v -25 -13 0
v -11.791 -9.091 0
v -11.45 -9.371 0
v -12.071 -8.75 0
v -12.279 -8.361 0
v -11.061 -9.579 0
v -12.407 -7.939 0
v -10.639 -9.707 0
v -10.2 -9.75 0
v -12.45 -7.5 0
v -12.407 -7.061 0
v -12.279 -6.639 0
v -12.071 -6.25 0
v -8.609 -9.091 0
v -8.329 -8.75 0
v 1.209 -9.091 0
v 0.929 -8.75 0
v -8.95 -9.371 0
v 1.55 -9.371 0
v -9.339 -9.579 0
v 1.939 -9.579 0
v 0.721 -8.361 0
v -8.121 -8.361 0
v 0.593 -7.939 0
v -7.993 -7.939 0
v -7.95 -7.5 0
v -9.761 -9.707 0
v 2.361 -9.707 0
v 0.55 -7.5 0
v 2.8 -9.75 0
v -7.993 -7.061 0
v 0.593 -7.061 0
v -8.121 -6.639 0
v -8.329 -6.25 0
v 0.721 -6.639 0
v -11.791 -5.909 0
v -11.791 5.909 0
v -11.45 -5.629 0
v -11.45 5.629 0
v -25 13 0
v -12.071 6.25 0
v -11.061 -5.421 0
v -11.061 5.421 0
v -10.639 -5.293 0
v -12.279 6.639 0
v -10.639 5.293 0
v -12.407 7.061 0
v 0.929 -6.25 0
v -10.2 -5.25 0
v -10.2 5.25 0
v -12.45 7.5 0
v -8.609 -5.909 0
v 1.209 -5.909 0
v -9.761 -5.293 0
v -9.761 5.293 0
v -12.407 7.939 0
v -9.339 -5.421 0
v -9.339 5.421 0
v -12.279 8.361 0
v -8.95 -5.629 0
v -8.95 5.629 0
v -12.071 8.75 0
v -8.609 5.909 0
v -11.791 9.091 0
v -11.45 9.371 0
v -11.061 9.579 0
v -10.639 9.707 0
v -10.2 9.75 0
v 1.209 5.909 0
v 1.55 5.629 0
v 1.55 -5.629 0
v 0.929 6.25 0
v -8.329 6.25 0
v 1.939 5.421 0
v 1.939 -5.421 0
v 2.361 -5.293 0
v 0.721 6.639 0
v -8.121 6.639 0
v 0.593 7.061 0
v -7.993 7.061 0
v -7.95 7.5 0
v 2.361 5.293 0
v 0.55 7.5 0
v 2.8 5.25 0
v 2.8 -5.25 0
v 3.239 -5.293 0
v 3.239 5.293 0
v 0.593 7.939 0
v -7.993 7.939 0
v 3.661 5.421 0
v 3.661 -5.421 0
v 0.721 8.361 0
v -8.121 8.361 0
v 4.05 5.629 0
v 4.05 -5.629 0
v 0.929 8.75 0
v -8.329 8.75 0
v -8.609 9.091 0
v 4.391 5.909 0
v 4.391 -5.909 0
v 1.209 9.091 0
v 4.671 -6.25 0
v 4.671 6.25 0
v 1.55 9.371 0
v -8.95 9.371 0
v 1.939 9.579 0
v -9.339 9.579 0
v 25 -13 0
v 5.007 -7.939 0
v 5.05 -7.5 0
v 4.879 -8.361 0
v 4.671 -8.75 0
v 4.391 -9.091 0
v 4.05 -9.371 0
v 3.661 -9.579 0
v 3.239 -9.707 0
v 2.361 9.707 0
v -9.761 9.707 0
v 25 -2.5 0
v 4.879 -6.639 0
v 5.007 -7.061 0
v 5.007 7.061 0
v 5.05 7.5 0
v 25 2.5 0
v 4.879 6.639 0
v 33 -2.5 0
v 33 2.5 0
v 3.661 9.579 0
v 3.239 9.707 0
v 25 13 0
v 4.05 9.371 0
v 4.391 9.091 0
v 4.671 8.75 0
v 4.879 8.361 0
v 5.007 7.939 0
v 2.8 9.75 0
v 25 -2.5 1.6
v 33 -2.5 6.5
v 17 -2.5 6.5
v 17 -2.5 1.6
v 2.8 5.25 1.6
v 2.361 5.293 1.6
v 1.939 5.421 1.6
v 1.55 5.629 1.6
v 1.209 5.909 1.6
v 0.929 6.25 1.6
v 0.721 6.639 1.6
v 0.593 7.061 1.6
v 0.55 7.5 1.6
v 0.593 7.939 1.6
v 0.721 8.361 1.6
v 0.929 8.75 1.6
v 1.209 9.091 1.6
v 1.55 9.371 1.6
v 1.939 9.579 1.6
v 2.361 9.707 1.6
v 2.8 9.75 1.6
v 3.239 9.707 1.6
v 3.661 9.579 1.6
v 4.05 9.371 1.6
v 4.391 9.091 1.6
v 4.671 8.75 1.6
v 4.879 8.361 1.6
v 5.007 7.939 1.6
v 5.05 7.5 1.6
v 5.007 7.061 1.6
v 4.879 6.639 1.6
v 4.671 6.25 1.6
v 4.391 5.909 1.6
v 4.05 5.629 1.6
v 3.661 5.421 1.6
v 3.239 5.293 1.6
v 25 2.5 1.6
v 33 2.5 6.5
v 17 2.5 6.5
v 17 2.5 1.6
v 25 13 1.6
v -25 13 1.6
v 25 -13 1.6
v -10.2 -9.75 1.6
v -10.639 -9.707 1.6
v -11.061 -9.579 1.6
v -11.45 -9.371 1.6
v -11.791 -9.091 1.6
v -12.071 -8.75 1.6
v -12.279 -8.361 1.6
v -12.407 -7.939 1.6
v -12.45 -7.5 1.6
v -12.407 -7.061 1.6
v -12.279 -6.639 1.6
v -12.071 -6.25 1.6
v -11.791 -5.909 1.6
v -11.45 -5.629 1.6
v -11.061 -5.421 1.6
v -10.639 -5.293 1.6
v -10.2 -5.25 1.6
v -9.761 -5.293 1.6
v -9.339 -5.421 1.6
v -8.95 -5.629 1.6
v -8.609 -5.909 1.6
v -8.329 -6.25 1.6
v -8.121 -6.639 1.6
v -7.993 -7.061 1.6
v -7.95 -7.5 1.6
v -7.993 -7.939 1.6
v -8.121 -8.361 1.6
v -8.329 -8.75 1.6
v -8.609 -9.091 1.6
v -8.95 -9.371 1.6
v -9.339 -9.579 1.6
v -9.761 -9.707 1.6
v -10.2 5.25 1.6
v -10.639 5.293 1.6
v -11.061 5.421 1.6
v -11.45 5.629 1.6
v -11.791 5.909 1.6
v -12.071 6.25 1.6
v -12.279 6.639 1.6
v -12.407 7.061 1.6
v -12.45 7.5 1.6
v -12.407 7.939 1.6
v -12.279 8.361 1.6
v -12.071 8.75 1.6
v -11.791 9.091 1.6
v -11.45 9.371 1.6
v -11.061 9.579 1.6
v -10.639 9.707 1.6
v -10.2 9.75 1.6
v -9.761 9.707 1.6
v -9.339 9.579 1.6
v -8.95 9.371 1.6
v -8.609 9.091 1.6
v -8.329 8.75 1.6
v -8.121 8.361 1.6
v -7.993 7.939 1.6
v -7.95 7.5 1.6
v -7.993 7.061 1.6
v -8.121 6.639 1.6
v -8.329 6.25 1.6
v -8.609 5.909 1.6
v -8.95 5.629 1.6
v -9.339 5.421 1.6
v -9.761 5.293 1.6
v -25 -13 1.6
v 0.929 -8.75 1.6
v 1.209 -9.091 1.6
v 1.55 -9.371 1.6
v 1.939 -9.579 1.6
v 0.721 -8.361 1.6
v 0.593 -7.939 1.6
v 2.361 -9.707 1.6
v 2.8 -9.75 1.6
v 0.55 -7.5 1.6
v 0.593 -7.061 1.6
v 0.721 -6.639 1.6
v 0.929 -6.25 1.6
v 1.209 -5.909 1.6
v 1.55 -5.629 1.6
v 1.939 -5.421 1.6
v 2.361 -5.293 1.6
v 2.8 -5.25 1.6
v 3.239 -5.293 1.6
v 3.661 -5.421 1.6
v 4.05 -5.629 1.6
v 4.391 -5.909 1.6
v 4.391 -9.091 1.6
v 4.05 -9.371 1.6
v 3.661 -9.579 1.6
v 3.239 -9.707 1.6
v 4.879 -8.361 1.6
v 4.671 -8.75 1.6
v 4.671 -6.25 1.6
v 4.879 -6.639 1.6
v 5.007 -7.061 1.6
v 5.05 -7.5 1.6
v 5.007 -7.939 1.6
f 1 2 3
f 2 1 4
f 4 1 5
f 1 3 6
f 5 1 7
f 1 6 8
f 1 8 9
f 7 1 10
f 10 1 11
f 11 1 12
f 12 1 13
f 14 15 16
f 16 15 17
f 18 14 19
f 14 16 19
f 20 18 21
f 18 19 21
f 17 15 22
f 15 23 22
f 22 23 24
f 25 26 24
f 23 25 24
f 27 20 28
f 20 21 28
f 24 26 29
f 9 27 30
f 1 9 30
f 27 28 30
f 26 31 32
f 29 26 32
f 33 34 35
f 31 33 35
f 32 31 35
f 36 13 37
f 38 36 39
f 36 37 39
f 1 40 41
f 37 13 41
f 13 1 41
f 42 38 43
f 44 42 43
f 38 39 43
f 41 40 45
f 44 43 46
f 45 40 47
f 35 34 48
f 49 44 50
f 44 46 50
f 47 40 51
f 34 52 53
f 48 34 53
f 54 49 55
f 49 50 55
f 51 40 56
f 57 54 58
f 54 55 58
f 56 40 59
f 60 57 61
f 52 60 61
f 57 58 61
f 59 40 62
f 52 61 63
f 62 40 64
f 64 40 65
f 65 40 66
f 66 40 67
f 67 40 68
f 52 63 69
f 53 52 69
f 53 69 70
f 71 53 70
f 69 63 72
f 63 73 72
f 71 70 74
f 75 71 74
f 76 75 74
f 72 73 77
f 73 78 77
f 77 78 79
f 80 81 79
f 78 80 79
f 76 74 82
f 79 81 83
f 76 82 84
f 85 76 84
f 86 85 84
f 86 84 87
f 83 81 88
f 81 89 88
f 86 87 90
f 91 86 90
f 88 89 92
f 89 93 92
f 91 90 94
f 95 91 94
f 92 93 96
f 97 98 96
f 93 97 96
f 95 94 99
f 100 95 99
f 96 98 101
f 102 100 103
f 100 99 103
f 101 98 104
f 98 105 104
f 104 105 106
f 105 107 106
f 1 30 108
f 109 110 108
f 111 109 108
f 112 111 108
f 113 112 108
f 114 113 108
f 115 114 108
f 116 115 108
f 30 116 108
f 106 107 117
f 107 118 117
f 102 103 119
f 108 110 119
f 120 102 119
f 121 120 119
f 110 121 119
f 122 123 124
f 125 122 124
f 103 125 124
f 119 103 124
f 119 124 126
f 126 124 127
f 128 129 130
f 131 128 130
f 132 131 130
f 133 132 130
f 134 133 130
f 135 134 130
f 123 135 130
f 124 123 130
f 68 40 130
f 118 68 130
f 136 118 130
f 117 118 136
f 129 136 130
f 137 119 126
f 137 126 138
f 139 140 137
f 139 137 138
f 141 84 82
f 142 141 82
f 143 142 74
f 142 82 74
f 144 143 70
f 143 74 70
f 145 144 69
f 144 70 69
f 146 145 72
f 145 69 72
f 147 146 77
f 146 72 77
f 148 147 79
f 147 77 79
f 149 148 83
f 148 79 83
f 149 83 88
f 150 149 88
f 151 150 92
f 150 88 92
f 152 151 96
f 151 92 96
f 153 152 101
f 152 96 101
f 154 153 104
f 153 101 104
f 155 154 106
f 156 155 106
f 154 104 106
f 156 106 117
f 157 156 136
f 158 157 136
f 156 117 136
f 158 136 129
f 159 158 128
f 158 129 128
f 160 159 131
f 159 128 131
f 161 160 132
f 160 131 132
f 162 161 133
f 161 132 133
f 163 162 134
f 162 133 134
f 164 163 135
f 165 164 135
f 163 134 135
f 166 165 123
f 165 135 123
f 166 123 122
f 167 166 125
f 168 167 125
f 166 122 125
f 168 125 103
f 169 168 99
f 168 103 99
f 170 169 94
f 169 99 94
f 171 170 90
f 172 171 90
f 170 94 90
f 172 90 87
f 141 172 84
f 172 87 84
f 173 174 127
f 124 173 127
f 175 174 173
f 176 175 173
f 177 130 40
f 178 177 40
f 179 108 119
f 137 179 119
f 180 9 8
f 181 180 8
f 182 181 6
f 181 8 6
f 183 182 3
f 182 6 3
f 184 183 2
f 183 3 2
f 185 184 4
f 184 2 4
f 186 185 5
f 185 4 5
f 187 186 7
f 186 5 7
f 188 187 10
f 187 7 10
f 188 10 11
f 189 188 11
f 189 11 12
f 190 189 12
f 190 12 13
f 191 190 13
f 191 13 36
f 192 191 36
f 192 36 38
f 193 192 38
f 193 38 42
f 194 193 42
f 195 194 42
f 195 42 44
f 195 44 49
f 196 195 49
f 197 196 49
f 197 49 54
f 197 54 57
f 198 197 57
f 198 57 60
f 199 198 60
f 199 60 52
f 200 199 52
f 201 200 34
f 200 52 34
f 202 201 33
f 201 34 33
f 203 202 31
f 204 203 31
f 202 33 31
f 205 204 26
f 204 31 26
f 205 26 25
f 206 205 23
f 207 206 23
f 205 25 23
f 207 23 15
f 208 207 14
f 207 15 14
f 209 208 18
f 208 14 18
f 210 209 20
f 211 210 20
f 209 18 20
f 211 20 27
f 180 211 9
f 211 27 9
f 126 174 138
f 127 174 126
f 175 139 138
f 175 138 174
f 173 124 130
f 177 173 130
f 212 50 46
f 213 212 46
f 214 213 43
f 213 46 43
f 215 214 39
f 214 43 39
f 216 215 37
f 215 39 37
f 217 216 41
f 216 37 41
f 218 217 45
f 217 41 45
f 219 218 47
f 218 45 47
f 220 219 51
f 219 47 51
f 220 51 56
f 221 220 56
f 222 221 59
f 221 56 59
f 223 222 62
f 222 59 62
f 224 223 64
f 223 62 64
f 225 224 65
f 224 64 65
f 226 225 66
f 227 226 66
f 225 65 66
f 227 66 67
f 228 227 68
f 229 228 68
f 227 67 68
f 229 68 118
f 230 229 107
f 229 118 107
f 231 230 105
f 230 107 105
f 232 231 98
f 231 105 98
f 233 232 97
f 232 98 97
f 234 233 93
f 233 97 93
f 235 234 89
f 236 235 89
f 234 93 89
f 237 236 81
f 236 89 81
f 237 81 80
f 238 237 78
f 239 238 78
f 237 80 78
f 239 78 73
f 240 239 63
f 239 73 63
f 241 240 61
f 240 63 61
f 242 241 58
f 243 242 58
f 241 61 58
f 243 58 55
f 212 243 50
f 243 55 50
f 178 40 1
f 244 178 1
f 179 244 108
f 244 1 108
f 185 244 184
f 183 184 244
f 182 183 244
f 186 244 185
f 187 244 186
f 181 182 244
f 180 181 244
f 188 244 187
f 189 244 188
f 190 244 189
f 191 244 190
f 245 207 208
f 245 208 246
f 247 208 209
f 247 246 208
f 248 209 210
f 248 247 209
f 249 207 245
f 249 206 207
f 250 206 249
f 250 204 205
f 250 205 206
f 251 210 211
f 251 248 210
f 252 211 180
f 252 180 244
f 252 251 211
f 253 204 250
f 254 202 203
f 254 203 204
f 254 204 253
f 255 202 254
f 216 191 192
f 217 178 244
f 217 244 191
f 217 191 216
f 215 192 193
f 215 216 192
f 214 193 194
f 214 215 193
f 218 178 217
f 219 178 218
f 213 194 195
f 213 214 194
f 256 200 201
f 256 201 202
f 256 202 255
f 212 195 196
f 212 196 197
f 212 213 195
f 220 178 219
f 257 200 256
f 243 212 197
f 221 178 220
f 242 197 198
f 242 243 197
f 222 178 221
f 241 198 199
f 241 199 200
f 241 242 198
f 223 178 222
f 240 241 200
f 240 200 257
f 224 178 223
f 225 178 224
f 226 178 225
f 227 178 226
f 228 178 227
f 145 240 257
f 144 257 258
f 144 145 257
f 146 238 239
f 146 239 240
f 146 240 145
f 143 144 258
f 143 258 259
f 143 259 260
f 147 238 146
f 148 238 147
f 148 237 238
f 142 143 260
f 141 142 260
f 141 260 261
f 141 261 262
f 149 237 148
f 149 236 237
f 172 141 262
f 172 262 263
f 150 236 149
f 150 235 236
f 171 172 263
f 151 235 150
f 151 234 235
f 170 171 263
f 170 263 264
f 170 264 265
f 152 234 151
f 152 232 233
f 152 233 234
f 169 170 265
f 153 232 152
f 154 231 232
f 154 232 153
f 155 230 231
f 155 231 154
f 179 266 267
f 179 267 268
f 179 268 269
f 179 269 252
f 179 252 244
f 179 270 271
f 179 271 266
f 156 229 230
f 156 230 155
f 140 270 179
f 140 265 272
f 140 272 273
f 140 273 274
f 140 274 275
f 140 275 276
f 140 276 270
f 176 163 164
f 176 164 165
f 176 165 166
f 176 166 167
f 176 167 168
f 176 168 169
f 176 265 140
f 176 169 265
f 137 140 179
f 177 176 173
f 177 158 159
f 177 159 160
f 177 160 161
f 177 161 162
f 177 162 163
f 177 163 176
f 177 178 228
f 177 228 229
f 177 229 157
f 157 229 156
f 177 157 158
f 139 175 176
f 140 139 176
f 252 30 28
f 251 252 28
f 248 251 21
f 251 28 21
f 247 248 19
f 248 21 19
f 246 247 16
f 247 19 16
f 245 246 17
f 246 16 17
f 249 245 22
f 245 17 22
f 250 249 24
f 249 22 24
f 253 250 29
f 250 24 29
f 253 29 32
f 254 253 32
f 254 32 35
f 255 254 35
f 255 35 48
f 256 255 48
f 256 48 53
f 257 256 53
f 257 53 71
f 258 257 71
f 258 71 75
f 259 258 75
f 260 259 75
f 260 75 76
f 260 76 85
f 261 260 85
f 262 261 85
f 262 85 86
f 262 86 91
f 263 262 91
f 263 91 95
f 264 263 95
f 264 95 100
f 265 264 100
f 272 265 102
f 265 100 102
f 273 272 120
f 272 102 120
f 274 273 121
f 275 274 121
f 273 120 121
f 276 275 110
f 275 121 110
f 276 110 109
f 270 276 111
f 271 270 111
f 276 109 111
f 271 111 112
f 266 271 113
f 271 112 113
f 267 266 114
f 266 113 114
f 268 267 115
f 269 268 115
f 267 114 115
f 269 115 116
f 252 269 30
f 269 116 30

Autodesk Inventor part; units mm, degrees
ref_plane "YZ Plane" through (0, 0, 0) normal (1, 0, 0) x (0, 1, 0)
ref_plane "XZ Plane" through (0, 0, 0) normal (0, 1, 0) x (-1, 0, 0)
ref_plane "XY Plane" through (0, 0, 0) normal (0, 0, 1) x (1, 0, 0)
sketch "Sketch1" plane through (0, 0, 0) normal (0, 0, 1) x (1, 0, 0)
  line L0 (-25, -13) -> (25, -13)
  line L1 (25, -13) -> (25, 13)
  line L2 (25, 13) -> (-25, 13)
  line L3 (-25, 13) -> (-25, -13)
  line L4 (-25, -13) -> (25, 13) construction
  line L5 (25, -13) -> (-25, 13) construction
  point P0 (0, 0)
  dimension "d0" = 50
  dimension "d1" = 26
extrude "Extrusion1" add sketch "Sketch1" along normal blind 1.6
sketch "Sketch2" plane through (0, 0, 1.6) normal (0, 0, 1) x (1, 0, 0)
  line L0 (-10.2, -7.5) -> (2.8, -7.5) construction
  line L1 (2.8, -7.5) -> (2.8, 7.5) construction
  line L2 (2.8, 7.5) -> (-10.2, 7.5) construction
  line L3 (-10.2, 7.5) -> (-10.2, -7.5) construction
  line L4 (-25, 13) -> (-25, -13) construction
  point P0 (0, 0)
  point P1 (2.8, 0)
  dimension "d4" = 13
  dimension "d5" = 15
  dimension "d6" = 14.8
hole "Hole1" at (-10.2, 7.5, 1.6) at (2.8, 7.5, 1.6) at (2.8, -7.5, 1.6) at (-10.2, -7.5, 1.6) direction (0, 0, -1) diameter 4.5 end through all clearance for "Countersunk Flat Head Screw DIN EN ISO 2009" size "M4" standard "DIN"
sketch "Sketch3" plane through (25, -13, 0) normal (1, 0, 0) x (0, 0, -1)
  line L0 (0, 10.5) -> (-6.5, 10.5)
  line L1 (-6.5, 10.5) -> (-6.5, 15.5)
  line L2 (-6.5, 15.5) -> (0, 15.5)
  line L3 (0, 15.5) -> (0, 10.5)
  line L4 (0, 0) -> (0, 26) projected
  point P0 (0, 13)
  point P1 (0, 13)
  point P2 (0, 13)
  point P3 (0, 13)
  dimension "d14" = 5
  dimension "d15" = 6.5
extrude "Extrusion2" add sketch "Sketch3" along normal mid plane 16
properties part number "IGBT_Platine"
